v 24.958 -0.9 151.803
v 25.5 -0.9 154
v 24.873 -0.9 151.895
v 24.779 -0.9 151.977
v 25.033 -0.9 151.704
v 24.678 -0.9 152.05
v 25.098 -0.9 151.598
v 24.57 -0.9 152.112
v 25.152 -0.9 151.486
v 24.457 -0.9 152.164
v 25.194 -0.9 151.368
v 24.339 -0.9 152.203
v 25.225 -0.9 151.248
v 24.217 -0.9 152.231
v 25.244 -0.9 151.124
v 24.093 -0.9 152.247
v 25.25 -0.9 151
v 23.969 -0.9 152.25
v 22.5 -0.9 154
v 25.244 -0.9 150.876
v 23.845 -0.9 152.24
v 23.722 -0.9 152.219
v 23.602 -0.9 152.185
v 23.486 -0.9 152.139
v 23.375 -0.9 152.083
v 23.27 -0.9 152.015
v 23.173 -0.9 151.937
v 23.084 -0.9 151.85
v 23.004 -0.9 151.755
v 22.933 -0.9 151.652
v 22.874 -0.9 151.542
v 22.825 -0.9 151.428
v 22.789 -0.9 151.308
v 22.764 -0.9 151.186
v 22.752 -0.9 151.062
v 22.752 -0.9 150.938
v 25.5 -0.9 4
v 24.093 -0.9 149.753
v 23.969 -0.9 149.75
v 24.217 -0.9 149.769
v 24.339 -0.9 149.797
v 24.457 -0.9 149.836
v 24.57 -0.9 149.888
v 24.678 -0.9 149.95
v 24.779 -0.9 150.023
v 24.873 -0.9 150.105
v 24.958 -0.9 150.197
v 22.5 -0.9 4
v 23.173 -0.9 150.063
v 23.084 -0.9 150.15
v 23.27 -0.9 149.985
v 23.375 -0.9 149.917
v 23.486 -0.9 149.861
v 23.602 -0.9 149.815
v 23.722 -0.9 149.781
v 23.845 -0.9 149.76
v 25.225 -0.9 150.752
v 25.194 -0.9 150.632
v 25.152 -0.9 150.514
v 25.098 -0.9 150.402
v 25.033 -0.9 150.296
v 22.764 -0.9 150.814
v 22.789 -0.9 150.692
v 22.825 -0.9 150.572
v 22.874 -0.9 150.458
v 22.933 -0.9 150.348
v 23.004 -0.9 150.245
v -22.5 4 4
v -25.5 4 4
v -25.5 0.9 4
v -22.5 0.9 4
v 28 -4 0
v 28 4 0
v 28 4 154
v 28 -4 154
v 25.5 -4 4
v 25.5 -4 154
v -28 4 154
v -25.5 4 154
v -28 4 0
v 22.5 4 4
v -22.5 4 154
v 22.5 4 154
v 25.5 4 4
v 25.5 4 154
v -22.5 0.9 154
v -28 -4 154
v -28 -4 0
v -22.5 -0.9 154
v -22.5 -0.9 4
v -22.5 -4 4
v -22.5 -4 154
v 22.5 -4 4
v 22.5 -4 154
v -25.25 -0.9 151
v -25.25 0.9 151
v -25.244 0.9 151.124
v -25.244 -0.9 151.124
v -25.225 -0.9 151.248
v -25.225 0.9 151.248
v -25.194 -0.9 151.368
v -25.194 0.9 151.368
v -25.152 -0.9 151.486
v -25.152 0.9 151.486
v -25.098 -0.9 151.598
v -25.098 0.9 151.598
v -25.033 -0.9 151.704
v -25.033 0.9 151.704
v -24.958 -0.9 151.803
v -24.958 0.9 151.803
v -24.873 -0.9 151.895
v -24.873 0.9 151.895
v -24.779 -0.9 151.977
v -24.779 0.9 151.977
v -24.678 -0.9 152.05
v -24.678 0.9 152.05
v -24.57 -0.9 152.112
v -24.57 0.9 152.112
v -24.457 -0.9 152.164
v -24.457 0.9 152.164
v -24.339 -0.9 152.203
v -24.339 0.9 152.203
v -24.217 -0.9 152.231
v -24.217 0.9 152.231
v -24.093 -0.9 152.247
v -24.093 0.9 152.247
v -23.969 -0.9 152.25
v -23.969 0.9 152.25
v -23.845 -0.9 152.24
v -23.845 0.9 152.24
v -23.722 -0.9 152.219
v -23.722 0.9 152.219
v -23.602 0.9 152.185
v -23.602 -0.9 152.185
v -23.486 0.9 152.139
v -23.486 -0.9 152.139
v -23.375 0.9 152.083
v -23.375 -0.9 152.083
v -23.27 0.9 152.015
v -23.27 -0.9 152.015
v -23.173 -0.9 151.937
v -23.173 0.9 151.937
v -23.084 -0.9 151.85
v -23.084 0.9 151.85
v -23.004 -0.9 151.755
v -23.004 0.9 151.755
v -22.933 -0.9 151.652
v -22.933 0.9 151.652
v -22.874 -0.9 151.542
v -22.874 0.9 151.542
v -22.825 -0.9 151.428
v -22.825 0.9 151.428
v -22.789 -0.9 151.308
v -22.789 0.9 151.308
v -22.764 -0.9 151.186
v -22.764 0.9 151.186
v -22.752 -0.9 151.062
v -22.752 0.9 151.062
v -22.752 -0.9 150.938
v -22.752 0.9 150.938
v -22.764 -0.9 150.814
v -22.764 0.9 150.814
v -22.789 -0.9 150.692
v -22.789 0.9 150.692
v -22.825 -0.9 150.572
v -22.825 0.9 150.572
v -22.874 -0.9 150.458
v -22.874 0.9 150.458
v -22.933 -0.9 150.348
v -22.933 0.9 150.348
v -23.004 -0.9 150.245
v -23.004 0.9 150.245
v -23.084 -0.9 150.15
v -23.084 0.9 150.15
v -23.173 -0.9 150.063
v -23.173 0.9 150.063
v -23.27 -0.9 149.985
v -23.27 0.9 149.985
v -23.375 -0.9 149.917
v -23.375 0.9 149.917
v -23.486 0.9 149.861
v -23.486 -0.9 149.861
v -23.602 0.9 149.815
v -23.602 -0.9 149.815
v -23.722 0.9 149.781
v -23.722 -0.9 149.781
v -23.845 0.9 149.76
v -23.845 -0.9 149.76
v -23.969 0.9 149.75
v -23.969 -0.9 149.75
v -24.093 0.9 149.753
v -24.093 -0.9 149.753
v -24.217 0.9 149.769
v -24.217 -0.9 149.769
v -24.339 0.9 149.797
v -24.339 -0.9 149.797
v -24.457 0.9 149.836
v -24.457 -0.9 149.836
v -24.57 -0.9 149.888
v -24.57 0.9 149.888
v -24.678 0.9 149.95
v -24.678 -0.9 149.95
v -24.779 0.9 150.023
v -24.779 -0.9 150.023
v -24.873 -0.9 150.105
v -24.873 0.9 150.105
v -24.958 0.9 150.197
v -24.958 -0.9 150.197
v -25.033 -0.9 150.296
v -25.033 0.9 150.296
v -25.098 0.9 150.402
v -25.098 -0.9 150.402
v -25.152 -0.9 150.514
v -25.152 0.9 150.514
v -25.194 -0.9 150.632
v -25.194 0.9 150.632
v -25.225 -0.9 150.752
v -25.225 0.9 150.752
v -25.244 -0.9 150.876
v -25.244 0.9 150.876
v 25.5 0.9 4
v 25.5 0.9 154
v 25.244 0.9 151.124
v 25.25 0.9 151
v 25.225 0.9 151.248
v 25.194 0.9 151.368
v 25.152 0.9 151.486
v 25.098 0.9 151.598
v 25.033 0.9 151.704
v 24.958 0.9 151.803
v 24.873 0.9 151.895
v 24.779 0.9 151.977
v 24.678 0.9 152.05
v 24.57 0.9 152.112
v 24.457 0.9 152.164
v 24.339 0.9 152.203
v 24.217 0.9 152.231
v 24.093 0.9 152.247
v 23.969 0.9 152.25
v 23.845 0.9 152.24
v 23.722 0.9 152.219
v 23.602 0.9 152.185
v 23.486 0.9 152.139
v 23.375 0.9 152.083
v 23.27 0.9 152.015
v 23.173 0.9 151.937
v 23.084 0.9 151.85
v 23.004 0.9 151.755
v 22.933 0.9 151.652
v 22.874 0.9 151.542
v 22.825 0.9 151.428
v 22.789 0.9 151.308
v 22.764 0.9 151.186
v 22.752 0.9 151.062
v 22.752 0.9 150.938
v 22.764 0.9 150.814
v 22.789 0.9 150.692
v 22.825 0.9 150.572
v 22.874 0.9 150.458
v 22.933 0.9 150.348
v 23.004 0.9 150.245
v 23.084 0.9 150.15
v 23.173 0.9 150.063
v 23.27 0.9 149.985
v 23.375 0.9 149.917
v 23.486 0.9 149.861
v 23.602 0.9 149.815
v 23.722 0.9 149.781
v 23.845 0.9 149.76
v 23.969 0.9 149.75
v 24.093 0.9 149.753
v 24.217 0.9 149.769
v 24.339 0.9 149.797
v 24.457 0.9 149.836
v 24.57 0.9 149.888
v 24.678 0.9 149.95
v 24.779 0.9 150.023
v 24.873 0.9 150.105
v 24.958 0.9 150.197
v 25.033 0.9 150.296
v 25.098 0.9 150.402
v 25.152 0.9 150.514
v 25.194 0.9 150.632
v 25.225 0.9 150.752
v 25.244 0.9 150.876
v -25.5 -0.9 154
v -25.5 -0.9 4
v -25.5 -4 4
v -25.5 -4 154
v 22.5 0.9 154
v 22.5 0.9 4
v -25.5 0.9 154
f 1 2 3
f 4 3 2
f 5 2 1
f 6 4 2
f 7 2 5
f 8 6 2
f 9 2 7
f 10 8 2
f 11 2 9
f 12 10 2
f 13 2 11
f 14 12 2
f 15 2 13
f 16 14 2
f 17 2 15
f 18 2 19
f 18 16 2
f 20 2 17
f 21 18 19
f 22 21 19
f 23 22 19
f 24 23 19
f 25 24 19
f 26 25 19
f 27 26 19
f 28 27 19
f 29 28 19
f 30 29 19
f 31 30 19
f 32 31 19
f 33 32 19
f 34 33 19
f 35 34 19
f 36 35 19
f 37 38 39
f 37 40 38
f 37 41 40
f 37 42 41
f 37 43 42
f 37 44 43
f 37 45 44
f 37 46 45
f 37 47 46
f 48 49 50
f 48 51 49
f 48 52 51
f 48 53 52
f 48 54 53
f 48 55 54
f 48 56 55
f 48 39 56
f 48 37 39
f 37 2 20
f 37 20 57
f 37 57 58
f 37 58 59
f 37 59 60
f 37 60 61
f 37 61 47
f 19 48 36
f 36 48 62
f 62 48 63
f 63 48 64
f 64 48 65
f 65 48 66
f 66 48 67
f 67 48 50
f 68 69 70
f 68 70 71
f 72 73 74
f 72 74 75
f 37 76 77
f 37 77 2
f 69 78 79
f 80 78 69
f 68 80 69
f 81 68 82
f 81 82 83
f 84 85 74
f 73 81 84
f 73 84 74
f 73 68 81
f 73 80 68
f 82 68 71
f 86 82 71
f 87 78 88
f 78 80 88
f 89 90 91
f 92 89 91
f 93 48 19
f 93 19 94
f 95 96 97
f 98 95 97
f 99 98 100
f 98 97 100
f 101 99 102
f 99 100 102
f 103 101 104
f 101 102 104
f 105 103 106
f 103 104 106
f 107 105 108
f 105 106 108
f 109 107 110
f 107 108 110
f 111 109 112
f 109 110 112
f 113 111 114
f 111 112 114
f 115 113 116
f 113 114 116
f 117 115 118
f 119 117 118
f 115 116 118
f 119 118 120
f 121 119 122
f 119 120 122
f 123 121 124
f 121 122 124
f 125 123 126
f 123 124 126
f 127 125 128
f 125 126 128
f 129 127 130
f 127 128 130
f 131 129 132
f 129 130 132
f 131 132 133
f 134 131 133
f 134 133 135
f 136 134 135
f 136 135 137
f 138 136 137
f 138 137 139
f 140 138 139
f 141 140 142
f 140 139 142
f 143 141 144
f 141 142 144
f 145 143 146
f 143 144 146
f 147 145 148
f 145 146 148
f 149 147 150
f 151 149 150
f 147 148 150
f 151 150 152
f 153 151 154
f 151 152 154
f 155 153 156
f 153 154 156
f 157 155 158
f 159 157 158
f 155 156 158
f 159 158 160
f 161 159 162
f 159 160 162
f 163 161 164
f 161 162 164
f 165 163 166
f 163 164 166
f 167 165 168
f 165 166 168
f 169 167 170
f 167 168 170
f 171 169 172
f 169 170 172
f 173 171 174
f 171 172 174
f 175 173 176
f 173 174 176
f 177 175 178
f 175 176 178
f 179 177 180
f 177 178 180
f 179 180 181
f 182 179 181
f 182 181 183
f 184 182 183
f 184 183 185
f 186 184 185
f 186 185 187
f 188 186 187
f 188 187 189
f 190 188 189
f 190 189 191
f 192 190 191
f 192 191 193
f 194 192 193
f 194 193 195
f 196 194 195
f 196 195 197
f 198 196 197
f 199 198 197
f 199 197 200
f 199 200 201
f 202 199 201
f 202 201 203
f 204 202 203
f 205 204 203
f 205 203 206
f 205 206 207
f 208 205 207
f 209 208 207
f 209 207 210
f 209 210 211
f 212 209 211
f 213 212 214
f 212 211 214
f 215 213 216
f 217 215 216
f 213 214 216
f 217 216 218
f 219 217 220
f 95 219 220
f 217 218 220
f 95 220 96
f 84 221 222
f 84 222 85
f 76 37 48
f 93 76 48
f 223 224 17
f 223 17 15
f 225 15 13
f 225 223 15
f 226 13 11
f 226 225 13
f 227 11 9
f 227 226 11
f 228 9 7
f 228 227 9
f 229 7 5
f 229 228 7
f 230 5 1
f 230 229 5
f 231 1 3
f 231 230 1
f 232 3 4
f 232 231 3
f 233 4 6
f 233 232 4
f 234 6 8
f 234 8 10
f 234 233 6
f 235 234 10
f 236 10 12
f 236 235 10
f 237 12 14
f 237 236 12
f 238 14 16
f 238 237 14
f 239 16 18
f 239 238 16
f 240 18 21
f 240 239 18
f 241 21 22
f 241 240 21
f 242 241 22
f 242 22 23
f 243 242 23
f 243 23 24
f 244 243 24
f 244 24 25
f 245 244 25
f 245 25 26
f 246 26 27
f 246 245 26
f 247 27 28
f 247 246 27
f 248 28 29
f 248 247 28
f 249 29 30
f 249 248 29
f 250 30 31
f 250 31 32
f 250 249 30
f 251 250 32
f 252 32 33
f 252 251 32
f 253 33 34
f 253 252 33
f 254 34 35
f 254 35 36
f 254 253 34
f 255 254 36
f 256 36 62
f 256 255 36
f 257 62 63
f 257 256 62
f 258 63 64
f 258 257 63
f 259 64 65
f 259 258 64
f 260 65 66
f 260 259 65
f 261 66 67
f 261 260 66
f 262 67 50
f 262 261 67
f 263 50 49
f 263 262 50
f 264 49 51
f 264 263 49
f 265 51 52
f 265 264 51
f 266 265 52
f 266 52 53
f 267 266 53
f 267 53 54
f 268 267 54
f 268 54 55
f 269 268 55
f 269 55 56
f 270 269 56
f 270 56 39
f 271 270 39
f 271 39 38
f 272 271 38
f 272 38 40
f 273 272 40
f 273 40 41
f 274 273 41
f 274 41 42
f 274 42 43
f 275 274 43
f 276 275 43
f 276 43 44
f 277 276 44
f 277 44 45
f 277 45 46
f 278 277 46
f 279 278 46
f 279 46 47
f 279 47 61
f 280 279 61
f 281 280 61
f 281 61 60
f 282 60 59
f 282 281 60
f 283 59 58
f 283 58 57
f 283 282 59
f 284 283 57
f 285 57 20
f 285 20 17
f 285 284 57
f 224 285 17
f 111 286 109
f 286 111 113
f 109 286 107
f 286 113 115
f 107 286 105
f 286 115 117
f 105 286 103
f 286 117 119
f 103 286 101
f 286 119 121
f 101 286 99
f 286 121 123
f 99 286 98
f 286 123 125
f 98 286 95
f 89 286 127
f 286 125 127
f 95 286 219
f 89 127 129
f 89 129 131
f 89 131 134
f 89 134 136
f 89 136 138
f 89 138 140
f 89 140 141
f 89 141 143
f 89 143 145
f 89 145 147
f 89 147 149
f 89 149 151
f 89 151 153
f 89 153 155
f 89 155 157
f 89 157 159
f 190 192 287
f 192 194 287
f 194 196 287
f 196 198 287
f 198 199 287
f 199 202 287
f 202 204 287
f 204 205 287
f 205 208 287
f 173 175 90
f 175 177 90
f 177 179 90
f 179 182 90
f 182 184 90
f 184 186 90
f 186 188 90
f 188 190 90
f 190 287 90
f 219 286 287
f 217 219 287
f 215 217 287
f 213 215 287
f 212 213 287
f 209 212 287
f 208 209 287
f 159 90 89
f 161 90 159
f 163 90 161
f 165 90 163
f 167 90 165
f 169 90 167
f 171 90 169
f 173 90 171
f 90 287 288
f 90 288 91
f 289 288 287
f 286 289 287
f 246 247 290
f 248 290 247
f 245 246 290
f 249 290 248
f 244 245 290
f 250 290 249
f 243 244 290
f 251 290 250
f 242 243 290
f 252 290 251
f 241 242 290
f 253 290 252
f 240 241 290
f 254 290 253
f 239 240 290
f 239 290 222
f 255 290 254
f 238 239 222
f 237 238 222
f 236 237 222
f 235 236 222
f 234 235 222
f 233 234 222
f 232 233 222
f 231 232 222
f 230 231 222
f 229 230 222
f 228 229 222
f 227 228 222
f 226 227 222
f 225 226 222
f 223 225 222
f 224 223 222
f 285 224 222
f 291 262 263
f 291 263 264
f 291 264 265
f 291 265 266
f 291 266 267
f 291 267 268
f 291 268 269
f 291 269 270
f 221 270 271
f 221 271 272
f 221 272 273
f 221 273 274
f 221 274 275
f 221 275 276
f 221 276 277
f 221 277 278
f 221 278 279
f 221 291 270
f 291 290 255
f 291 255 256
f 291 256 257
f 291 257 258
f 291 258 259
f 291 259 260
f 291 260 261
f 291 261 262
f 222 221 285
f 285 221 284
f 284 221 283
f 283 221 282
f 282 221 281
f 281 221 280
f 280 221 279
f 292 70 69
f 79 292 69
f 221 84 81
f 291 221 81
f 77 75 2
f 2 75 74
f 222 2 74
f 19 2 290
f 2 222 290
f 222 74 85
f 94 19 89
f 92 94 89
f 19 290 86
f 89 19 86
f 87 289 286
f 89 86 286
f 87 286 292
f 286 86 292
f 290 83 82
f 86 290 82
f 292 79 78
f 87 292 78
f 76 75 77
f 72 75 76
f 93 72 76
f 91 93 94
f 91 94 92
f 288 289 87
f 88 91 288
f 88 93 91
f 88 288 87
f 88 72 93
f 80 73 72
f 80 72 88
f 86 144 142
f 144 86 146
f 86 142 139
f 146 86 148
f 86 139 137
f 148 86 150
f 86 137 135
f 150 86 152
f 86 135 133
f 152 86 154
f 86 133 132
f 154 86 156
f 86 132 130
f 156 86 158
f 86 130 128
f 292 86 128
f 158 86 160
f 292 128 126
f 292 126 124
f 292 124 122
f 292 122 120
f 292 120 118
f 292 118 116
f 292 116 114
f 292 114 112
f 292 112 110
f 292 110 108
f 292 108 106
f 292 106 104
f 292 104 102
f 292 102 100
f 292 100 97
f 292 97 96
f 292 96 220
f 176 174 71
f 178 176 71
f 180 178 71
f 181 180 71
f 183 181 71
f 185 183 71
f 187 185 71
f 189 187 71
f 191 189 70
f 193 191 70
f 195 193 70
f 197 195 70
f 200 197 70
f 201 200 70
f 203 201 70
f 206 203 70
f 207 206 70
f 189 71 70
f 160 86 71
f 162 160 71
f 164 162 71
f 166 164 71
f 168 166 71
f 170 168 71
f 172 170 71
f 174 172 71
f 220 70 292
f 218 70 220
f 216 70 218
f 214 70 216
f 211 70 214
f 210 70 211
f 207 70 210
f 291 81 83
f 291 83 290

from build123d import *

# Parameters (mm, degrees)
SKETCH_W     = 28
SKETCH_H     = 8
PAD_DEPTH    = 4
PAD001_DEPTH = 150
SKETCH002_R  = 1.25
POCKET_DEPTH = 1.8


with BuildPart() as part:
    # Sketch → Pad (new body)
    with BuildSketch(Plane.XY):
        with Locations((-14, 0)):
            Rectangle(SKETCH_W, SKETCH_H)
    pad = extrude(amount=PAD_DEPTH)

    # Sketch001 (on Face6 of Pad) → Pad001 (join)
    with BuildSketch(Plane.XY.offset(4)):
        Polygon((-22.5, 0.9), (-25.5, 0.9), (-25.5, 4), (-28, 4), (-28, -4), (-25.5, -4), (-25.5, -0.9), (-22.5, -0.9), (-22.5, -4), (0, -4), (0, 4), (-22.5, 4), align=None)
    pad001 = extrude(amount=PAD001_DEPTH)

    # Sketch002 (on Face14 of Pad001) → Pocket (cut)
    with BuildSketch(Plane(origin=(0, 0.9, 0), x_dir=(-1, 0, 0), z_dir=(0, 1, 0))):
        with Locations((24, 151)):
            Circle(SKETCH002_R)
    pocket = extrude(amount=-POCKET_DEPTH, mode=Mode.SUBTRACT)

    # Mirrored: Pad, Pad001, Pocket across Sketch V_Axis
    add(pad.mirror(Plane(origin=(0, 0, 0), x_dir=(0, 0, 1), z_dir=(1, 0, 0))))
    add(pad001.mirror(Plane(origin=(0, 0, 0), x_dir=(0, 0, 1), z_dir=(1, 0, 0))))
    add(pocket.mirror(Plane(origin=(0, 0, 0), x_dir=(0, 0, 1), z_dir=(1, 0, 0))), mode=Mode.SUBTRACT)


solid = part.part
